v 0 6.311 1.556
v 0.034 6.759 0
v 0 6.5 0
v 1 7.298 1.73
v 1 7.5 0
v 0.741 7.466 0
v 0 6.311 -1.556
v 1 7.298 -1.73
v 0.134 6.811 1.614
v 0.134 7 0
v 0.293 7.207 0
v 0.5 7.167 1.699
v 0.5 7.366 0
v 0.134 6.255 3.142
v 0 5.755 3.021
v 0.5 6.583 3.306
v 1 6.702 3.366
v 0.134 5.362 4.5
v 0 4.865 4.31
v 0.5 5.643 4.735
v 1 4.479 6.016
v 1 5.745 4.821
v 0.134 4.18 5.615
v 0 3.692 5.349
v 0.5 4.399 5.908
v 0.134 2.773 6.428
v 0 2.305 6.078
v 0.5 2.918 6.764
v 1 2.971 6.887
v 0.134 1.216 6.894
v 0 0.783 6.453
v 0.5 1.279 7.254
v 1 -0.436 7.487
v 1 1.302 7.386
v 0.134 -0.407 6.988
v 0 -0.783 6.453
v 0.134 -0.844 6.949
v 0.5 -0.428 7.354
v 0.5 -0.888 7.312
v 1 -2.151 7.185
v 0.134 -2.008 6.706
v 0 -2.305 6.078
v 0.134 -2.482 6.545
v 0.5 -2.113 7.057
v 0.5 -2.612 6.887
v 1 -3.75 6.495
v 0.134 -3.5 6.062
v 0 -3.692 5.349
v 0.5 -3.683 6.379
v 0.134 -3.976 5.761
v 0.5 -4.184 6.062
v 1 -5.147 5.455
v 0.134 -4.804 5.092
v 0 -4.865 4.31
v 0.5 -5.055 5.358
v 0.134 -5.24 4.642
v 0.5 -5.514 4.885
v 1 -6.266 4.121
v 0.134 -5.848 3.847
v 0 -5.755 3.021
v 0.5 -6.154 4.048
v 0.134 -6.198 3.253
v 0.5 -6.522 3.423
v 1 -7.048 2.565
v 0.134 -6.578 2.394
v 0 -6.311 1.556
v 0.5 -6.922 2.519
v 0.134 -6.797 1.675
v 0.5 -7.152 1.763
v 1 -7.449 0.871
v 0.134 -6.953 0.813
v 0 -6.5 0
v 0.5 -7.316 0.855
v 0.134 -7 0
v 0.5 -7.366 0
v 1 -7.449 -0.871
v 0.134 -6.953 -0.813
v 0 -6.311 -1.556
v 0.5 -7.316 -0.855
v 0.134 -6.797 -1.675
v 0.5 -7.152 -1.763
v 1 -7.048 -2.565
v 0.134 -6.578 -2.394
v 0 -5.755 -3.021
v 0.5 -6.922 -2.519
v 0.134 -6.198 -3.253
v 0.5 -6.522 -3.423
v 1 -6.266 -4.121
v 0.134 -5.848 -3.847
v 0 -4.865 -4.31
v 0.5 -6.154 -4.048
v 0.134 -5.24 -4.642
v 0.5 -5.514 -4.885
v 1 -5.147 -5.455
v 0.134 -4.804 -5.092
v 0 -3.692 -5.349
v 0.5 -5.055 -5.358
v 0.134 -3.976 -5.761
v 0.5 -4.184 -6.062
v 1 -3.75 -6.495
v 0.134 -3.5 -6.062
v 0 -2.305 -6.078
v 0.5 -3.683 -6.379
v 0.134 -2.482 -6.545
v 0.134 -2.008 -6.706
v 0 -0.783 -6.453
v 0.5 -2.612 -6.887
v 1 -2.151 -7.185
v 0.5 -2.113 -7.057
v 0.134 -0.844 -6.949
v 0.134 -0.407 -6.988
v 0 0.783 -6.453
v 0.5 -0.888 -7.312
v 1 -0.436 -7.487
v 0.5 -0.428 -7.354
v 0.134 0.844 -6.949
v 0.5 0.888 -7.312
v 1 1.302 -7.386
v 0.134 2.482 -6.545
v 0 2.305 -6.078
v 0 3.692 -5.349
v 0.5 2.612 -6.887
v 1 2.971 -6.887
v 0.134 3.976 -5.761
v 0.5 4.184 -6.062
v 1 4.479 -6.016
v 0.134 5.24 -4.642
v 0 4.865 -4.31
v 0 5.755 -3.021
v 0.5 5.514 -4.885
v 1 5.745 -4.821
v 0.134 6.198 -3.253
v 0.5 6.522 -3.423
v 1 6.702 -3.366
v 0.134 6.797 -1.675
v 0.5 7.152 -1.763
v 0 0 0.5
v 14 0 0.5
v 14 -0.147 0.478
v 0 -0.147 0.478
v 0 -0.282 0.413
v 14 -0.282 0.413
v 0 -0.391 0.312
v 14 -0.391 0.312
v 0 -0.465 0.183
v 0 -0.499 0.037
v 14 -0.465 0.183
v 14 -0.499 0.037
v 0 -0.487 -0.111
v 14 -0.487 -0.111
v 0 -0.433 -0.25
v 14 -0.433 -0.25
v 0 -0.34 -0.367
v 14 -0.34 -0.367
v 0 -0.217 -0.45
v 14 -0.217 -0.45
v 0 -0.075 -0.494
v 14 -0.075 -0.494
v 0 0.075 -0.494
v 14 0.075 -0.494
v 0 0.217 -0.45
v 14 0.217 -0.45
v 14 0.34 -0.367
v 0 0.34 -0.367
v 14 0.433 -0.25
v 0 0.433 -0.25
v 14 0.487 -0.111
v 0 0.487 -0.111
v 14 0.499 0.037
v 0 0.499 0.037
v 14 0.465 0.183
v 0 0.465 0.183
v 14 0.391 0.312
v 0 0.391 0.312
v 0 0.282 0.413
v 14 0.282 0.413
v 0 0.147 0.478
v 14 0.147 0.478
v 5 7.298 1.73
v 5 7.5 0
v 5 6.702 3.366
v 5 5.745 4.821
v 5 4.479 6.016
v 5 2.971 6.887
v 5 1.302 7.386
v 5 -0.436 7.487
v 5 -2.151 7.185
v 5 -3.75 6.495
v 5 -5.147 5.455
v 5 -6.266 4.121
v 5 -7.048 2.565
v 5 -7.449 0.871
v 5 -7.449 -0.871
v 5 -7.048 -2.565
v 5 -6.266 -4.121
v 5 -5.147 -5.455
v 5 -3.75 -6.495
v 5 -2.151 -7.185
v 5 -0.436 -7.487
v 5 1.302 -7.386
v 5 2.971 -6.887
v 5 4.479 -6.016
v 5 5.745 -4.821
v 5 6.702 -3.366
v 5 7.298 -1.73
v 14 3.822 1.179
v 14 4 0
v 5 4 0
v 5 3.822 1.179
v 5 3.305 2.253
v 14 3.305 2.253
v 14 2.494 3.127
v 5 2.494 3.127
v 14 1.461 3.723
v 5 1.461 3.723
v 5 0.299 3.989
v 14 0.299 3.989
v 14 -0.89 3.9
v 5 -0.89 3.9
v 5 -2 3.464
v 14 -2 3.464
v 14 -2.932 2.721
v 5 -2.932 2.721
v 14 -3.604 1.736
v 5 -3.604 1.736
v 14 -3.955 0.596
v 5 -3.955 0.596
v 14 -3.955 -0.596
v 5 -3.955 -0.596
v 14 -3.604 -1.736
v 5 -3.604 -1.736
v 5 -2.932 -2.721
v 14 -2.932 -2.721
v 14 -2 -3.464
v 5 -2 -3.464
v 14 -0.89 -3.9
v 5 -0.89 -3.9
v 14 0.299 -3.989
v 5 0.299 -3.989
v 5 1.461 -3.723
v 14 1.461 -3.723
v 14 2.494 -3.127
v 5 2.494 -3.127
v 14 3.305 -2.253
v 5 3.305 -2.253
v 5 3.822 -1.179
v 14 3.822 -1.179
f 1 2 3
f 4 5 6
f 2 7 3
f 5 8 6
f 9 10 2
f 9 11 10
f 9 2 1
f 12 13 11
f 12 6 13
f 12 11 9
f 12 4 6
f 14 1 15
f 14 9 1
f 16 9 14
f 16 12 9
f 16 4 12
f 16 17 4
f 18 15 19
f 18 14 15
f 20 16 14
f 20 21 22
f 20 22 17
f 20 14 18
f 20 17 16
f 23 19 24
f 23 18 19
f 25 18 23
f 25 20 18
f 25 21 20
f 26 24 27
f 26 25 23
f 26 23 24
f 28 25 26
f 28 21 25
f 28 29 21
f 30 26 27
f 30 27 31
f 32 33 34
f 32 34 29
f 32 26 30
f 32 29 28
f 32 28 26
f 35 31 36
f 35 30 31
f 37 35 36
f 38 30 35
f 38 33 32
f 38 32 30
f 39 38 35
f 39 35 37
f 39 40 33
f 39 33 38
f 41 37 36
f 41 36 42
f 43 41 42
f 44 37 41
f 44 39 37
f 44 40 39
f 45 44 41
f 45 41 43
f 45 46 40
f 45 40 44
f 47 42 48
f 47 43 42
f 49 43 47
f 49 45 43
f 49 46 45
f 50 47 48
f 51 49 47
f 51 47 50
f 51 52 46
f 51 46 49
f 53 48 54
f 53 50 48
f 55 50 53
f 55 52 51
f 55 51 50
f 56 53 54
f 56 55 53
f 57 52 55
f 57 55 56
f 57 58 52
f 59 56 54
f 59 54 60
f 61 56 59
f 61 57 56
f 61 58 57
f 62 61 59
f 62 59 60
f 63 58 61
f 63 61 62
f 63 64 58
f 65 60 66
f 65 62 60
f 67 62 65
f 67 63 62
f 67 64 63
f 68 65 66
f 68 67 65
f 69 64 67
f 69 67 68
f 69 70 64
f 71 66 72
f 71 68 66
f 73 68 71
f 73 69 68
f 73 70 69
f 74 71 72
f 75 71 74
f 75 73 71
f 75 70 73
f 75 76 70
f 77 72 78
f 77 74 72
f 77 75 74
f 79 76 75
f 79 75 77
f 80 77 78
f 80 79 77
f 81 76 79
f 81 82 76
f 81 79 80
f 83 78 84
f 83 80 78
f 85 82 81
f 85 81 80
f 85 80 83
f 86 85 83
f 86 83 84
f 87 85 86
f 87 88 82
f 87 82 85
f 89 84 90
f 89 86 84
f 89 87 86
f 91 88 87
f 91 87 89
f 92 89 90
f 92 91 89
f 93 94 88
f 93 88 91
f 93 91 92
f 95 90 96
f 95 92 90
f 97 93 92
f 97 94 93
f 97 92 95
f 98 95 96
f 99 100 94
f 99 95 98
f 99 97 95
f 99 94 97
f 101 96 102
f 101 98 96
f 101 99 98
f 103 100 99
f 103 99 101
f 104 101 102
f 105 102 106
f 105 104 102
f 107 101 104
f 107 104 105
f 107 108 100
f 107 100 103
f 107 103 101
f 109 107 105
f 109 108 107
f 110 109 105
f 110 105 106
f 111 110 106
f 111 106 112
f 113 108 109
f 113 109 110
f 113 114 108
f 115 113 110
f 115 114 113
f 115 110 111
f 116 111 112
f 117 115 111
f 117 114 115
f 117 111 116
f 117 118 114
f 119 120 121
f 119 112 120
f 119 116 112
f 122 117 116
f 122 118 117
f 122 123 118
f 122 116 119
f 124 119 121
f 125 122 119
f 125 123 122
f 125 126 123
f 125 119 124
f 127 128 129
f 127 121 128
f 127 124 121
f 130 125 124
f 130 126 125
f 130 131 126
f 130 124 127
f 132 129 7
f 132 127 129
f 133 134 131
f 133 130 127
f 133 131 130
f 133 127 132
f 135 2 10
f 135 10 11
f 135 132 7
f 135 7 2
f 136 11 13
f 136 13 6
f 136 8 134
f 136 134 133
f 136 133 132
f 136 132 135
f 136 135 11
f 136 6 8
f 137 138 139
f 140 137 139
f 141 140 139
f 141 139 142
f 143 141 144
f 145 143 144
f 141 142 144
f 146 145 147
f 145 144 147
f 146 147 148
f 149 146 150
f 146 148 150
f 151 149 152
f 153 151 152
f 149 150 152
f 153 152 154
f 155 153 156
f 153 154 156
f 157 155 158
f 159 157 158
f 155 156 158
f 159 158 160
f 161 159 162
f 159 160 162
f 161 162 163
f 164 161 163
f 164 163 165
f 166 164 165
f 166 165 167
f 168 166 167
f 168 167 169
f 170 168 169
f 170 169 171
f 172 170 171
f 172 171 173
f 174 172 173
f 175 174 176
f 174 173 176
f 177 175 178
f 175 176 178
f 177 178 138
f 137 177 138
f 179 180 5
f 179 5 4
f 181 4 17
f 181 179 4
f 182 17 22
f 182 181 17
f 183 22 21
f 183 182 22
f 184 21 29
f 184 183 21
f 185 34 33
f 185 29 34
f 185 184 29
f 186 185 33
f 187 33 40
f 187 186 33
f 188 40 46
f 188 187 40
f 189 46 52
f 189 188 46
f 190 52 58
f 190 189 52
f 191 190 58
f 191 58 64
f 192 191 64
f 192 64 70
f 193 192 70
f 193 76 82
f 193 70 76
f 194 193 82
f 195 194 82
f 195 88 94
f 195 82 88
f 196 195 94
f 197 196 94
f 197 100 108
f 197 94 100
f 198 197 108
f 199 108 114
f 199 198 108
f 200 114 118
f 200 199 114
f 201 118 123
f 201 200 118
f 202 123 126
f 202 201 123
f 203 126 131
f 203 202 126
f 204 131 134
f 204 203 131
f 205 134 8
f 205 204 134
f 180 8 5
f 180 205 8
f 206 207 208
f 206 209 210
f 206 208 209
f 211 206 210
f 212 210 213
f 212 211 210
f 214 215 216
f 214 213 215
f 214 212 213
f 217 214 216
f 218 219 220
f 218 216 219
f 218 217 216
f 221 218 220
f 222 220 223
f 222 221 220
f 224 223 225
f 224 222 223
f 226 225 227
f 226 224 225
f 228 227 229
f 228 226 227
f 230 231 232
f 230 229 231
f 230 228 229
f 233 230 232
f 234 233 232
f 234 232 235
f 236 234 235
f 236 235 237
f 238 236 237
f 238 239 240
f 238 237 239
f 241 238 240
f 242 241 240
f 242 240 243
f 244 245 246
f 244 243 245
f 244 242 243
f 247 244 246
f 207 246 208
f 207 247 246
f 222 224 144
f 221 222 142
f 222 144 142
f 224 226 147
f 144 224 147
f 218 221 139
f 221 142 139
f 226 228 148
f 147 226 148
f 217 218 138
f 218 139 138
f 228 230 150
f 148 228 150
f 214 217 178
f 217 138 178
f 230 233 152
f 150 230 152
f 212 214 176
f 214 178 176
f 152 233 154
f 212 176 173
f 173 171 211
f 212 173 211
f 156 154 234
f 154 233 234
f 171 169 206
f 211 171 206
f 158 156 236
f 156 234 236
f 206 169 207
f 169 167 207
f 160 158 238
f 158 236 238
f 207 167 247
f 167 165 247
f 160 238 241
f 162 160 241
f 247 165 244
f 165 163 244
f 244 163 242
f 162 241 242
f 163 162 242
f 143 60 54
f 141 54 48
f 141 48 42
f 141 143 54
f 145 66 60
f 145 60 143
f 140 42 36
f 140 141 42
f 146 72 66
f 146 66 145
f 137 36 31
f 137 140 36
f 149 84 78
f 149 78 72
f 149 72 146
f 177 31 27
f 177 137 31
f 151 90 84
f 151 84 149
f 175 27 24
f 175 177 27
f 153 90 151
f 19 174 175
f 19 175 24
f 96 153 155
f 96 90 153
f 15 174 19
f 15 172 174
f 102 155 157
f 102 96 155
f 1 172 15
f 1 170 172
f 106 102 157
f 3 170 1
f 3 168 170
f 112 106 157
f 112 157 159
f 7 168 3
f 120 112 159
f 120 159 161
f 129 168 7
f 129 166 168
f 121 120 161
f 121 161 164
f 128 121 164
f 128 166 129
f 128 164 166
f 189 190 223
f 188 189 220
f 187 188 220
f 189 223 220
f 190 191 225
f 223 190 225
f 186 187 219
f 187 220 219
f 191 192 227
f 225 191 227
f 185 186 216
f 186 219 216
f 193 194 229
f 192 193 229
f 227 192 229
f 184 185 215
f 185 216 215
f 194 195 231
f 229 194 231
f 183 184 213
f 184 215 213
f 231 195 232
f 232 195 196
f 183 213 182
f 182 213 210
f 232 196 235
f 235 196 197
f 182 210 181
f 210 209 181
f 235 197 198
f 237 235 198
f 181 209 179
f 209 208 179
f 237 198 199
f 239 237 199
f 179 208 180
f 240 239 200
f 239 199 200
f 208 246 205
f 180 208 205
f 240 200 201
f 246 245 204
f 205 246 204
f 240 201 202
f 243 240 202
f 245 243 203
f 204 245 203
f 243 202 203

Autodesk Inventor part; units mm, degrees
ref_plane "YZ Plane" through (0, 0, 0) normal (1, 0, 0) x (0, 1, 0)
ref_plane "XZ Plane" through (0, 0, 0) normal (0, 1, 0) x (-1, 0, 0)
ref_plane "XY Plane" through (0, 0, 0) normal (0, 0, 1) x (1, 0, 0)
sketch "Skizze1" plane through (0, 0, 0) normal (0, 0, 1) x (1, 0, 0)
  line L0 (0, 0) -> (0, 7.5)
  line L1 (0, 7.5) -> (5, 7.5)
  line L2 (5, 7.5) -> (5, 4)
  line L3 (5, 4) -> (14, 4)
  line L4 (14, 4) -> (14, 0)
  line L5 (14, 0) -> (0, 0)
  dimension "d0" = 15
  dimension "d1" = 9
  dimension "d2" = 5
  dimension "d3" = 8
revolve "Umdrehung1" add sketch "Skizze1" angle 360 about axis through (14, 0, 0) along (-1, 0, 0)
thread "Gewinde1" size "M8x1.25" class "6g" standard "ISO Metric profile" length 11
sketch "Skizze2" plane through (0, 0, 0) normal (-1, 0, 0) x (0, 0, 1)
  circle A0 centre (0, 0) radius 7.5 projected
  point P0 (0, 0)
hole "Bohrung1" at (0, 0, 0) direction (1, 0, 0) diameter 1 depth 14
fillet "Rundung1" radius 1 1 edges at (0, -7.5, 0)
properties part number "1 part 4" material "Stahl, galvanisiert"
